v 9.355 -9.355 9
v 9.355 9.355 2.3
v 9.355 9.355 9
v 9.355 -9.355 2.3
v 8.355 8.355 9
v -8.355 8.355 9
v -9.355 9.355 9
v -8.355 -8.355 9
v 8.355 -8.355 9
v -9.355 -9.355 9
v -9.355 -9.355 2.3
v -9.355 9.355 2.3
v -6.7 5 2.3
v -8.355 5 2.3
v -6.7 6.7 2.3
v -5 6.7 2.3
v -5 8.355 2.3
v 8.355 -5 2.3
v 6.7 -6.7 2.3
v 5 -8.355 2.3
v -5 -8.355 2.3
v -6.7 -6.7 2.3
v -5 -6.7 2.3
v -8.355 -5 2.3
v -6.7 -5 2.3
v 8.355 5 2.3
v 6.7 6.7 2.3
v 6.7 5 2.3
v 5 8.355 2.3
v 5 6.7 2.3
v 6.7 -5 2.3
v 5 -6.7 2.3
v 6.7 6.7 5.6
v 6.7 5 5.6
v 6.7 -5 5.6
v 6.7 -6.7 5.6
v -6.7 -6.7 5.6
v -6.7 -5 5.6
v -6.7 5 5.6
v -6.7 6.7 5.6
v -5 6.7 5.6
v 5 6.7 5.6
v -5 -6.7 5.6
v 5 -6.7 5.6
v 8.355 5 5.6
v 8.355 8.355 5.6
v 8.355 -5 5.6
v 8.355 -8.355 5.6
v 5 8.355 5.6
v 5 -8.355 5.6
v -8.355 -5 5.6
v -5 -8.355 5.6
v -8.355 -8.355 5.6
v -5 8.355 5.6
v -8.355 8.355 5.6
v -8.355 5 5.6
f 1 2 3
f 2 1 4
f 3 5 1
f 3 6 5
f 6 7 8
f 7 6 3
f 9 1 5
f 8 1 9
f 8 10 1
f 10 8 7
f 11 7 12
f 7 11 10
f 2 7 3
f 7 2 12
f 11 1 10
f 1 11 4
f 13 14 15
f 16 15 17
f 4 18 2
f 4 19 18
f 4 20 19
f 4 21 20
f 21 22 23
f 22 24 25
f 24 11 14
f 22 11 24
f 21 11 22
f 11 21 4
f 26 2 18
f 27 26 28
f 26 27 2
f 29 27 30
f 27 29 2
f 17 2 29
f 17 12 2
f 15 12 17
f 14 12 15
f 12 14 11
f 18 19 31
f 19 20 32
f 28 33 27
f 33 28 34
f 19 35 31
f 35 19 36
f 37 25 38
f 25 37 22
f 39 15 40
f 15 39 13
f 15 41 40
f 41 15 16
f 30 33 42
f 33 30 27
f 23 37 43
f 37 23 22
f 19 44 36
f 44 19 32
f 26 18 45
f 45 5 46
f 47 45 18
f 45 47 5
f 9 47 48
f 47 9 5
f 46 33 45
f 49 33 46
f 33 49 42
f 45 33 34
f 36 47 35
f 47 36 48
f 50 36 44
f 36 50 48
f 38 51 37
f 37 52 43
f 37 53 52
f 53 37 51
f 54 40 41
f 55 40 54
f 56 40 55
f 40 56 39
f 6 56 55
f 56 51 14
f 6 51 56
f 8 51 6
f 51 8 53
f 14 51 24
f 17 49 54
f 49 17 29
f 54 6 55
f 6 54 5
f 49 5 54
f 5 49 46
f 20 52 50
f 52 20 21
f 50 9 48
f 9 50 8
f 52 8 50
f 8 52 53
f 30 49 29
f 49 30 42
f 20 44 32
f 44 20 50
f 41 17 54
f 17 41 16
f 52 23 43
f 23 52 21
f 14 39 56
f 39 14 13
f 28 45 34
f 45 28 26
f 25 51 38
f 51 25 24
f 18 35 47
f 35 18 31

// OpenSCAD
//鍵帽矽膠模具組 Stem模具 物品放置固定座
//用於建立磁磚鍵帽或者任意平面物體當作鍵帽用

// Keycaps Stem Silicone Molds Fixtures

module OneU(){
    size_calibration=15.9/16.3; //尺寸校準,依照自己印表機調整, 為 實際/設定值 的比例
    PlatformSize=16.3/size_calibration; //放置物品的平台的長寬尺寸(方形)
    GrooveSize=13.4; //矽膠座的長寬
    GrooveSizeH=6.8; //矽膠座的高度
    //BodySize=22; //外框尺寸: 矽膠座含底部花瓣長寬
    BodySize=PlatformSize+2; //改以承接平台尺寸加2mm當作外框尺寸 
   
    echo(str(" 尺寸校準=", size_calibration,"修正後尺寸=", PlatformSize));
    PlatformHight=9; //平台高度

difference() { 
    //主體
    translate([0,0,PlatformHight/2]) 
        cube([BodySize,BodySize,PlatformHight],center=true);  

    //底部(花瓣)
    translate([0,0,2.3/2]) 
        cube([22.7,22.7,2.3],center=true);  

    //中央凹槽(矽膠座空間)
    translate([0,0,GrooveSizeH/2]) 
        cube([GrooveSize,GrooveSize,GrooveSizeH],center=true);

    //上方放置區 
    translate([0,0,2.3+GrooveSizeH-1]) 
        #cube([PlatformSize,PlatformSize,5],center=true);

    //固定位置只剩四周,讓其他面不會沾黏到溢出的環氧樹酯
    translate([0,0,PlatformHight/2]) 
        cube([10,PlatformSize,PlatformHight],center=true);
    translate([0,0,PlatformHight/2]) 
        cube([PlatformSize,10,PlatformHight],center=true);
    
    };
}


OneU();
